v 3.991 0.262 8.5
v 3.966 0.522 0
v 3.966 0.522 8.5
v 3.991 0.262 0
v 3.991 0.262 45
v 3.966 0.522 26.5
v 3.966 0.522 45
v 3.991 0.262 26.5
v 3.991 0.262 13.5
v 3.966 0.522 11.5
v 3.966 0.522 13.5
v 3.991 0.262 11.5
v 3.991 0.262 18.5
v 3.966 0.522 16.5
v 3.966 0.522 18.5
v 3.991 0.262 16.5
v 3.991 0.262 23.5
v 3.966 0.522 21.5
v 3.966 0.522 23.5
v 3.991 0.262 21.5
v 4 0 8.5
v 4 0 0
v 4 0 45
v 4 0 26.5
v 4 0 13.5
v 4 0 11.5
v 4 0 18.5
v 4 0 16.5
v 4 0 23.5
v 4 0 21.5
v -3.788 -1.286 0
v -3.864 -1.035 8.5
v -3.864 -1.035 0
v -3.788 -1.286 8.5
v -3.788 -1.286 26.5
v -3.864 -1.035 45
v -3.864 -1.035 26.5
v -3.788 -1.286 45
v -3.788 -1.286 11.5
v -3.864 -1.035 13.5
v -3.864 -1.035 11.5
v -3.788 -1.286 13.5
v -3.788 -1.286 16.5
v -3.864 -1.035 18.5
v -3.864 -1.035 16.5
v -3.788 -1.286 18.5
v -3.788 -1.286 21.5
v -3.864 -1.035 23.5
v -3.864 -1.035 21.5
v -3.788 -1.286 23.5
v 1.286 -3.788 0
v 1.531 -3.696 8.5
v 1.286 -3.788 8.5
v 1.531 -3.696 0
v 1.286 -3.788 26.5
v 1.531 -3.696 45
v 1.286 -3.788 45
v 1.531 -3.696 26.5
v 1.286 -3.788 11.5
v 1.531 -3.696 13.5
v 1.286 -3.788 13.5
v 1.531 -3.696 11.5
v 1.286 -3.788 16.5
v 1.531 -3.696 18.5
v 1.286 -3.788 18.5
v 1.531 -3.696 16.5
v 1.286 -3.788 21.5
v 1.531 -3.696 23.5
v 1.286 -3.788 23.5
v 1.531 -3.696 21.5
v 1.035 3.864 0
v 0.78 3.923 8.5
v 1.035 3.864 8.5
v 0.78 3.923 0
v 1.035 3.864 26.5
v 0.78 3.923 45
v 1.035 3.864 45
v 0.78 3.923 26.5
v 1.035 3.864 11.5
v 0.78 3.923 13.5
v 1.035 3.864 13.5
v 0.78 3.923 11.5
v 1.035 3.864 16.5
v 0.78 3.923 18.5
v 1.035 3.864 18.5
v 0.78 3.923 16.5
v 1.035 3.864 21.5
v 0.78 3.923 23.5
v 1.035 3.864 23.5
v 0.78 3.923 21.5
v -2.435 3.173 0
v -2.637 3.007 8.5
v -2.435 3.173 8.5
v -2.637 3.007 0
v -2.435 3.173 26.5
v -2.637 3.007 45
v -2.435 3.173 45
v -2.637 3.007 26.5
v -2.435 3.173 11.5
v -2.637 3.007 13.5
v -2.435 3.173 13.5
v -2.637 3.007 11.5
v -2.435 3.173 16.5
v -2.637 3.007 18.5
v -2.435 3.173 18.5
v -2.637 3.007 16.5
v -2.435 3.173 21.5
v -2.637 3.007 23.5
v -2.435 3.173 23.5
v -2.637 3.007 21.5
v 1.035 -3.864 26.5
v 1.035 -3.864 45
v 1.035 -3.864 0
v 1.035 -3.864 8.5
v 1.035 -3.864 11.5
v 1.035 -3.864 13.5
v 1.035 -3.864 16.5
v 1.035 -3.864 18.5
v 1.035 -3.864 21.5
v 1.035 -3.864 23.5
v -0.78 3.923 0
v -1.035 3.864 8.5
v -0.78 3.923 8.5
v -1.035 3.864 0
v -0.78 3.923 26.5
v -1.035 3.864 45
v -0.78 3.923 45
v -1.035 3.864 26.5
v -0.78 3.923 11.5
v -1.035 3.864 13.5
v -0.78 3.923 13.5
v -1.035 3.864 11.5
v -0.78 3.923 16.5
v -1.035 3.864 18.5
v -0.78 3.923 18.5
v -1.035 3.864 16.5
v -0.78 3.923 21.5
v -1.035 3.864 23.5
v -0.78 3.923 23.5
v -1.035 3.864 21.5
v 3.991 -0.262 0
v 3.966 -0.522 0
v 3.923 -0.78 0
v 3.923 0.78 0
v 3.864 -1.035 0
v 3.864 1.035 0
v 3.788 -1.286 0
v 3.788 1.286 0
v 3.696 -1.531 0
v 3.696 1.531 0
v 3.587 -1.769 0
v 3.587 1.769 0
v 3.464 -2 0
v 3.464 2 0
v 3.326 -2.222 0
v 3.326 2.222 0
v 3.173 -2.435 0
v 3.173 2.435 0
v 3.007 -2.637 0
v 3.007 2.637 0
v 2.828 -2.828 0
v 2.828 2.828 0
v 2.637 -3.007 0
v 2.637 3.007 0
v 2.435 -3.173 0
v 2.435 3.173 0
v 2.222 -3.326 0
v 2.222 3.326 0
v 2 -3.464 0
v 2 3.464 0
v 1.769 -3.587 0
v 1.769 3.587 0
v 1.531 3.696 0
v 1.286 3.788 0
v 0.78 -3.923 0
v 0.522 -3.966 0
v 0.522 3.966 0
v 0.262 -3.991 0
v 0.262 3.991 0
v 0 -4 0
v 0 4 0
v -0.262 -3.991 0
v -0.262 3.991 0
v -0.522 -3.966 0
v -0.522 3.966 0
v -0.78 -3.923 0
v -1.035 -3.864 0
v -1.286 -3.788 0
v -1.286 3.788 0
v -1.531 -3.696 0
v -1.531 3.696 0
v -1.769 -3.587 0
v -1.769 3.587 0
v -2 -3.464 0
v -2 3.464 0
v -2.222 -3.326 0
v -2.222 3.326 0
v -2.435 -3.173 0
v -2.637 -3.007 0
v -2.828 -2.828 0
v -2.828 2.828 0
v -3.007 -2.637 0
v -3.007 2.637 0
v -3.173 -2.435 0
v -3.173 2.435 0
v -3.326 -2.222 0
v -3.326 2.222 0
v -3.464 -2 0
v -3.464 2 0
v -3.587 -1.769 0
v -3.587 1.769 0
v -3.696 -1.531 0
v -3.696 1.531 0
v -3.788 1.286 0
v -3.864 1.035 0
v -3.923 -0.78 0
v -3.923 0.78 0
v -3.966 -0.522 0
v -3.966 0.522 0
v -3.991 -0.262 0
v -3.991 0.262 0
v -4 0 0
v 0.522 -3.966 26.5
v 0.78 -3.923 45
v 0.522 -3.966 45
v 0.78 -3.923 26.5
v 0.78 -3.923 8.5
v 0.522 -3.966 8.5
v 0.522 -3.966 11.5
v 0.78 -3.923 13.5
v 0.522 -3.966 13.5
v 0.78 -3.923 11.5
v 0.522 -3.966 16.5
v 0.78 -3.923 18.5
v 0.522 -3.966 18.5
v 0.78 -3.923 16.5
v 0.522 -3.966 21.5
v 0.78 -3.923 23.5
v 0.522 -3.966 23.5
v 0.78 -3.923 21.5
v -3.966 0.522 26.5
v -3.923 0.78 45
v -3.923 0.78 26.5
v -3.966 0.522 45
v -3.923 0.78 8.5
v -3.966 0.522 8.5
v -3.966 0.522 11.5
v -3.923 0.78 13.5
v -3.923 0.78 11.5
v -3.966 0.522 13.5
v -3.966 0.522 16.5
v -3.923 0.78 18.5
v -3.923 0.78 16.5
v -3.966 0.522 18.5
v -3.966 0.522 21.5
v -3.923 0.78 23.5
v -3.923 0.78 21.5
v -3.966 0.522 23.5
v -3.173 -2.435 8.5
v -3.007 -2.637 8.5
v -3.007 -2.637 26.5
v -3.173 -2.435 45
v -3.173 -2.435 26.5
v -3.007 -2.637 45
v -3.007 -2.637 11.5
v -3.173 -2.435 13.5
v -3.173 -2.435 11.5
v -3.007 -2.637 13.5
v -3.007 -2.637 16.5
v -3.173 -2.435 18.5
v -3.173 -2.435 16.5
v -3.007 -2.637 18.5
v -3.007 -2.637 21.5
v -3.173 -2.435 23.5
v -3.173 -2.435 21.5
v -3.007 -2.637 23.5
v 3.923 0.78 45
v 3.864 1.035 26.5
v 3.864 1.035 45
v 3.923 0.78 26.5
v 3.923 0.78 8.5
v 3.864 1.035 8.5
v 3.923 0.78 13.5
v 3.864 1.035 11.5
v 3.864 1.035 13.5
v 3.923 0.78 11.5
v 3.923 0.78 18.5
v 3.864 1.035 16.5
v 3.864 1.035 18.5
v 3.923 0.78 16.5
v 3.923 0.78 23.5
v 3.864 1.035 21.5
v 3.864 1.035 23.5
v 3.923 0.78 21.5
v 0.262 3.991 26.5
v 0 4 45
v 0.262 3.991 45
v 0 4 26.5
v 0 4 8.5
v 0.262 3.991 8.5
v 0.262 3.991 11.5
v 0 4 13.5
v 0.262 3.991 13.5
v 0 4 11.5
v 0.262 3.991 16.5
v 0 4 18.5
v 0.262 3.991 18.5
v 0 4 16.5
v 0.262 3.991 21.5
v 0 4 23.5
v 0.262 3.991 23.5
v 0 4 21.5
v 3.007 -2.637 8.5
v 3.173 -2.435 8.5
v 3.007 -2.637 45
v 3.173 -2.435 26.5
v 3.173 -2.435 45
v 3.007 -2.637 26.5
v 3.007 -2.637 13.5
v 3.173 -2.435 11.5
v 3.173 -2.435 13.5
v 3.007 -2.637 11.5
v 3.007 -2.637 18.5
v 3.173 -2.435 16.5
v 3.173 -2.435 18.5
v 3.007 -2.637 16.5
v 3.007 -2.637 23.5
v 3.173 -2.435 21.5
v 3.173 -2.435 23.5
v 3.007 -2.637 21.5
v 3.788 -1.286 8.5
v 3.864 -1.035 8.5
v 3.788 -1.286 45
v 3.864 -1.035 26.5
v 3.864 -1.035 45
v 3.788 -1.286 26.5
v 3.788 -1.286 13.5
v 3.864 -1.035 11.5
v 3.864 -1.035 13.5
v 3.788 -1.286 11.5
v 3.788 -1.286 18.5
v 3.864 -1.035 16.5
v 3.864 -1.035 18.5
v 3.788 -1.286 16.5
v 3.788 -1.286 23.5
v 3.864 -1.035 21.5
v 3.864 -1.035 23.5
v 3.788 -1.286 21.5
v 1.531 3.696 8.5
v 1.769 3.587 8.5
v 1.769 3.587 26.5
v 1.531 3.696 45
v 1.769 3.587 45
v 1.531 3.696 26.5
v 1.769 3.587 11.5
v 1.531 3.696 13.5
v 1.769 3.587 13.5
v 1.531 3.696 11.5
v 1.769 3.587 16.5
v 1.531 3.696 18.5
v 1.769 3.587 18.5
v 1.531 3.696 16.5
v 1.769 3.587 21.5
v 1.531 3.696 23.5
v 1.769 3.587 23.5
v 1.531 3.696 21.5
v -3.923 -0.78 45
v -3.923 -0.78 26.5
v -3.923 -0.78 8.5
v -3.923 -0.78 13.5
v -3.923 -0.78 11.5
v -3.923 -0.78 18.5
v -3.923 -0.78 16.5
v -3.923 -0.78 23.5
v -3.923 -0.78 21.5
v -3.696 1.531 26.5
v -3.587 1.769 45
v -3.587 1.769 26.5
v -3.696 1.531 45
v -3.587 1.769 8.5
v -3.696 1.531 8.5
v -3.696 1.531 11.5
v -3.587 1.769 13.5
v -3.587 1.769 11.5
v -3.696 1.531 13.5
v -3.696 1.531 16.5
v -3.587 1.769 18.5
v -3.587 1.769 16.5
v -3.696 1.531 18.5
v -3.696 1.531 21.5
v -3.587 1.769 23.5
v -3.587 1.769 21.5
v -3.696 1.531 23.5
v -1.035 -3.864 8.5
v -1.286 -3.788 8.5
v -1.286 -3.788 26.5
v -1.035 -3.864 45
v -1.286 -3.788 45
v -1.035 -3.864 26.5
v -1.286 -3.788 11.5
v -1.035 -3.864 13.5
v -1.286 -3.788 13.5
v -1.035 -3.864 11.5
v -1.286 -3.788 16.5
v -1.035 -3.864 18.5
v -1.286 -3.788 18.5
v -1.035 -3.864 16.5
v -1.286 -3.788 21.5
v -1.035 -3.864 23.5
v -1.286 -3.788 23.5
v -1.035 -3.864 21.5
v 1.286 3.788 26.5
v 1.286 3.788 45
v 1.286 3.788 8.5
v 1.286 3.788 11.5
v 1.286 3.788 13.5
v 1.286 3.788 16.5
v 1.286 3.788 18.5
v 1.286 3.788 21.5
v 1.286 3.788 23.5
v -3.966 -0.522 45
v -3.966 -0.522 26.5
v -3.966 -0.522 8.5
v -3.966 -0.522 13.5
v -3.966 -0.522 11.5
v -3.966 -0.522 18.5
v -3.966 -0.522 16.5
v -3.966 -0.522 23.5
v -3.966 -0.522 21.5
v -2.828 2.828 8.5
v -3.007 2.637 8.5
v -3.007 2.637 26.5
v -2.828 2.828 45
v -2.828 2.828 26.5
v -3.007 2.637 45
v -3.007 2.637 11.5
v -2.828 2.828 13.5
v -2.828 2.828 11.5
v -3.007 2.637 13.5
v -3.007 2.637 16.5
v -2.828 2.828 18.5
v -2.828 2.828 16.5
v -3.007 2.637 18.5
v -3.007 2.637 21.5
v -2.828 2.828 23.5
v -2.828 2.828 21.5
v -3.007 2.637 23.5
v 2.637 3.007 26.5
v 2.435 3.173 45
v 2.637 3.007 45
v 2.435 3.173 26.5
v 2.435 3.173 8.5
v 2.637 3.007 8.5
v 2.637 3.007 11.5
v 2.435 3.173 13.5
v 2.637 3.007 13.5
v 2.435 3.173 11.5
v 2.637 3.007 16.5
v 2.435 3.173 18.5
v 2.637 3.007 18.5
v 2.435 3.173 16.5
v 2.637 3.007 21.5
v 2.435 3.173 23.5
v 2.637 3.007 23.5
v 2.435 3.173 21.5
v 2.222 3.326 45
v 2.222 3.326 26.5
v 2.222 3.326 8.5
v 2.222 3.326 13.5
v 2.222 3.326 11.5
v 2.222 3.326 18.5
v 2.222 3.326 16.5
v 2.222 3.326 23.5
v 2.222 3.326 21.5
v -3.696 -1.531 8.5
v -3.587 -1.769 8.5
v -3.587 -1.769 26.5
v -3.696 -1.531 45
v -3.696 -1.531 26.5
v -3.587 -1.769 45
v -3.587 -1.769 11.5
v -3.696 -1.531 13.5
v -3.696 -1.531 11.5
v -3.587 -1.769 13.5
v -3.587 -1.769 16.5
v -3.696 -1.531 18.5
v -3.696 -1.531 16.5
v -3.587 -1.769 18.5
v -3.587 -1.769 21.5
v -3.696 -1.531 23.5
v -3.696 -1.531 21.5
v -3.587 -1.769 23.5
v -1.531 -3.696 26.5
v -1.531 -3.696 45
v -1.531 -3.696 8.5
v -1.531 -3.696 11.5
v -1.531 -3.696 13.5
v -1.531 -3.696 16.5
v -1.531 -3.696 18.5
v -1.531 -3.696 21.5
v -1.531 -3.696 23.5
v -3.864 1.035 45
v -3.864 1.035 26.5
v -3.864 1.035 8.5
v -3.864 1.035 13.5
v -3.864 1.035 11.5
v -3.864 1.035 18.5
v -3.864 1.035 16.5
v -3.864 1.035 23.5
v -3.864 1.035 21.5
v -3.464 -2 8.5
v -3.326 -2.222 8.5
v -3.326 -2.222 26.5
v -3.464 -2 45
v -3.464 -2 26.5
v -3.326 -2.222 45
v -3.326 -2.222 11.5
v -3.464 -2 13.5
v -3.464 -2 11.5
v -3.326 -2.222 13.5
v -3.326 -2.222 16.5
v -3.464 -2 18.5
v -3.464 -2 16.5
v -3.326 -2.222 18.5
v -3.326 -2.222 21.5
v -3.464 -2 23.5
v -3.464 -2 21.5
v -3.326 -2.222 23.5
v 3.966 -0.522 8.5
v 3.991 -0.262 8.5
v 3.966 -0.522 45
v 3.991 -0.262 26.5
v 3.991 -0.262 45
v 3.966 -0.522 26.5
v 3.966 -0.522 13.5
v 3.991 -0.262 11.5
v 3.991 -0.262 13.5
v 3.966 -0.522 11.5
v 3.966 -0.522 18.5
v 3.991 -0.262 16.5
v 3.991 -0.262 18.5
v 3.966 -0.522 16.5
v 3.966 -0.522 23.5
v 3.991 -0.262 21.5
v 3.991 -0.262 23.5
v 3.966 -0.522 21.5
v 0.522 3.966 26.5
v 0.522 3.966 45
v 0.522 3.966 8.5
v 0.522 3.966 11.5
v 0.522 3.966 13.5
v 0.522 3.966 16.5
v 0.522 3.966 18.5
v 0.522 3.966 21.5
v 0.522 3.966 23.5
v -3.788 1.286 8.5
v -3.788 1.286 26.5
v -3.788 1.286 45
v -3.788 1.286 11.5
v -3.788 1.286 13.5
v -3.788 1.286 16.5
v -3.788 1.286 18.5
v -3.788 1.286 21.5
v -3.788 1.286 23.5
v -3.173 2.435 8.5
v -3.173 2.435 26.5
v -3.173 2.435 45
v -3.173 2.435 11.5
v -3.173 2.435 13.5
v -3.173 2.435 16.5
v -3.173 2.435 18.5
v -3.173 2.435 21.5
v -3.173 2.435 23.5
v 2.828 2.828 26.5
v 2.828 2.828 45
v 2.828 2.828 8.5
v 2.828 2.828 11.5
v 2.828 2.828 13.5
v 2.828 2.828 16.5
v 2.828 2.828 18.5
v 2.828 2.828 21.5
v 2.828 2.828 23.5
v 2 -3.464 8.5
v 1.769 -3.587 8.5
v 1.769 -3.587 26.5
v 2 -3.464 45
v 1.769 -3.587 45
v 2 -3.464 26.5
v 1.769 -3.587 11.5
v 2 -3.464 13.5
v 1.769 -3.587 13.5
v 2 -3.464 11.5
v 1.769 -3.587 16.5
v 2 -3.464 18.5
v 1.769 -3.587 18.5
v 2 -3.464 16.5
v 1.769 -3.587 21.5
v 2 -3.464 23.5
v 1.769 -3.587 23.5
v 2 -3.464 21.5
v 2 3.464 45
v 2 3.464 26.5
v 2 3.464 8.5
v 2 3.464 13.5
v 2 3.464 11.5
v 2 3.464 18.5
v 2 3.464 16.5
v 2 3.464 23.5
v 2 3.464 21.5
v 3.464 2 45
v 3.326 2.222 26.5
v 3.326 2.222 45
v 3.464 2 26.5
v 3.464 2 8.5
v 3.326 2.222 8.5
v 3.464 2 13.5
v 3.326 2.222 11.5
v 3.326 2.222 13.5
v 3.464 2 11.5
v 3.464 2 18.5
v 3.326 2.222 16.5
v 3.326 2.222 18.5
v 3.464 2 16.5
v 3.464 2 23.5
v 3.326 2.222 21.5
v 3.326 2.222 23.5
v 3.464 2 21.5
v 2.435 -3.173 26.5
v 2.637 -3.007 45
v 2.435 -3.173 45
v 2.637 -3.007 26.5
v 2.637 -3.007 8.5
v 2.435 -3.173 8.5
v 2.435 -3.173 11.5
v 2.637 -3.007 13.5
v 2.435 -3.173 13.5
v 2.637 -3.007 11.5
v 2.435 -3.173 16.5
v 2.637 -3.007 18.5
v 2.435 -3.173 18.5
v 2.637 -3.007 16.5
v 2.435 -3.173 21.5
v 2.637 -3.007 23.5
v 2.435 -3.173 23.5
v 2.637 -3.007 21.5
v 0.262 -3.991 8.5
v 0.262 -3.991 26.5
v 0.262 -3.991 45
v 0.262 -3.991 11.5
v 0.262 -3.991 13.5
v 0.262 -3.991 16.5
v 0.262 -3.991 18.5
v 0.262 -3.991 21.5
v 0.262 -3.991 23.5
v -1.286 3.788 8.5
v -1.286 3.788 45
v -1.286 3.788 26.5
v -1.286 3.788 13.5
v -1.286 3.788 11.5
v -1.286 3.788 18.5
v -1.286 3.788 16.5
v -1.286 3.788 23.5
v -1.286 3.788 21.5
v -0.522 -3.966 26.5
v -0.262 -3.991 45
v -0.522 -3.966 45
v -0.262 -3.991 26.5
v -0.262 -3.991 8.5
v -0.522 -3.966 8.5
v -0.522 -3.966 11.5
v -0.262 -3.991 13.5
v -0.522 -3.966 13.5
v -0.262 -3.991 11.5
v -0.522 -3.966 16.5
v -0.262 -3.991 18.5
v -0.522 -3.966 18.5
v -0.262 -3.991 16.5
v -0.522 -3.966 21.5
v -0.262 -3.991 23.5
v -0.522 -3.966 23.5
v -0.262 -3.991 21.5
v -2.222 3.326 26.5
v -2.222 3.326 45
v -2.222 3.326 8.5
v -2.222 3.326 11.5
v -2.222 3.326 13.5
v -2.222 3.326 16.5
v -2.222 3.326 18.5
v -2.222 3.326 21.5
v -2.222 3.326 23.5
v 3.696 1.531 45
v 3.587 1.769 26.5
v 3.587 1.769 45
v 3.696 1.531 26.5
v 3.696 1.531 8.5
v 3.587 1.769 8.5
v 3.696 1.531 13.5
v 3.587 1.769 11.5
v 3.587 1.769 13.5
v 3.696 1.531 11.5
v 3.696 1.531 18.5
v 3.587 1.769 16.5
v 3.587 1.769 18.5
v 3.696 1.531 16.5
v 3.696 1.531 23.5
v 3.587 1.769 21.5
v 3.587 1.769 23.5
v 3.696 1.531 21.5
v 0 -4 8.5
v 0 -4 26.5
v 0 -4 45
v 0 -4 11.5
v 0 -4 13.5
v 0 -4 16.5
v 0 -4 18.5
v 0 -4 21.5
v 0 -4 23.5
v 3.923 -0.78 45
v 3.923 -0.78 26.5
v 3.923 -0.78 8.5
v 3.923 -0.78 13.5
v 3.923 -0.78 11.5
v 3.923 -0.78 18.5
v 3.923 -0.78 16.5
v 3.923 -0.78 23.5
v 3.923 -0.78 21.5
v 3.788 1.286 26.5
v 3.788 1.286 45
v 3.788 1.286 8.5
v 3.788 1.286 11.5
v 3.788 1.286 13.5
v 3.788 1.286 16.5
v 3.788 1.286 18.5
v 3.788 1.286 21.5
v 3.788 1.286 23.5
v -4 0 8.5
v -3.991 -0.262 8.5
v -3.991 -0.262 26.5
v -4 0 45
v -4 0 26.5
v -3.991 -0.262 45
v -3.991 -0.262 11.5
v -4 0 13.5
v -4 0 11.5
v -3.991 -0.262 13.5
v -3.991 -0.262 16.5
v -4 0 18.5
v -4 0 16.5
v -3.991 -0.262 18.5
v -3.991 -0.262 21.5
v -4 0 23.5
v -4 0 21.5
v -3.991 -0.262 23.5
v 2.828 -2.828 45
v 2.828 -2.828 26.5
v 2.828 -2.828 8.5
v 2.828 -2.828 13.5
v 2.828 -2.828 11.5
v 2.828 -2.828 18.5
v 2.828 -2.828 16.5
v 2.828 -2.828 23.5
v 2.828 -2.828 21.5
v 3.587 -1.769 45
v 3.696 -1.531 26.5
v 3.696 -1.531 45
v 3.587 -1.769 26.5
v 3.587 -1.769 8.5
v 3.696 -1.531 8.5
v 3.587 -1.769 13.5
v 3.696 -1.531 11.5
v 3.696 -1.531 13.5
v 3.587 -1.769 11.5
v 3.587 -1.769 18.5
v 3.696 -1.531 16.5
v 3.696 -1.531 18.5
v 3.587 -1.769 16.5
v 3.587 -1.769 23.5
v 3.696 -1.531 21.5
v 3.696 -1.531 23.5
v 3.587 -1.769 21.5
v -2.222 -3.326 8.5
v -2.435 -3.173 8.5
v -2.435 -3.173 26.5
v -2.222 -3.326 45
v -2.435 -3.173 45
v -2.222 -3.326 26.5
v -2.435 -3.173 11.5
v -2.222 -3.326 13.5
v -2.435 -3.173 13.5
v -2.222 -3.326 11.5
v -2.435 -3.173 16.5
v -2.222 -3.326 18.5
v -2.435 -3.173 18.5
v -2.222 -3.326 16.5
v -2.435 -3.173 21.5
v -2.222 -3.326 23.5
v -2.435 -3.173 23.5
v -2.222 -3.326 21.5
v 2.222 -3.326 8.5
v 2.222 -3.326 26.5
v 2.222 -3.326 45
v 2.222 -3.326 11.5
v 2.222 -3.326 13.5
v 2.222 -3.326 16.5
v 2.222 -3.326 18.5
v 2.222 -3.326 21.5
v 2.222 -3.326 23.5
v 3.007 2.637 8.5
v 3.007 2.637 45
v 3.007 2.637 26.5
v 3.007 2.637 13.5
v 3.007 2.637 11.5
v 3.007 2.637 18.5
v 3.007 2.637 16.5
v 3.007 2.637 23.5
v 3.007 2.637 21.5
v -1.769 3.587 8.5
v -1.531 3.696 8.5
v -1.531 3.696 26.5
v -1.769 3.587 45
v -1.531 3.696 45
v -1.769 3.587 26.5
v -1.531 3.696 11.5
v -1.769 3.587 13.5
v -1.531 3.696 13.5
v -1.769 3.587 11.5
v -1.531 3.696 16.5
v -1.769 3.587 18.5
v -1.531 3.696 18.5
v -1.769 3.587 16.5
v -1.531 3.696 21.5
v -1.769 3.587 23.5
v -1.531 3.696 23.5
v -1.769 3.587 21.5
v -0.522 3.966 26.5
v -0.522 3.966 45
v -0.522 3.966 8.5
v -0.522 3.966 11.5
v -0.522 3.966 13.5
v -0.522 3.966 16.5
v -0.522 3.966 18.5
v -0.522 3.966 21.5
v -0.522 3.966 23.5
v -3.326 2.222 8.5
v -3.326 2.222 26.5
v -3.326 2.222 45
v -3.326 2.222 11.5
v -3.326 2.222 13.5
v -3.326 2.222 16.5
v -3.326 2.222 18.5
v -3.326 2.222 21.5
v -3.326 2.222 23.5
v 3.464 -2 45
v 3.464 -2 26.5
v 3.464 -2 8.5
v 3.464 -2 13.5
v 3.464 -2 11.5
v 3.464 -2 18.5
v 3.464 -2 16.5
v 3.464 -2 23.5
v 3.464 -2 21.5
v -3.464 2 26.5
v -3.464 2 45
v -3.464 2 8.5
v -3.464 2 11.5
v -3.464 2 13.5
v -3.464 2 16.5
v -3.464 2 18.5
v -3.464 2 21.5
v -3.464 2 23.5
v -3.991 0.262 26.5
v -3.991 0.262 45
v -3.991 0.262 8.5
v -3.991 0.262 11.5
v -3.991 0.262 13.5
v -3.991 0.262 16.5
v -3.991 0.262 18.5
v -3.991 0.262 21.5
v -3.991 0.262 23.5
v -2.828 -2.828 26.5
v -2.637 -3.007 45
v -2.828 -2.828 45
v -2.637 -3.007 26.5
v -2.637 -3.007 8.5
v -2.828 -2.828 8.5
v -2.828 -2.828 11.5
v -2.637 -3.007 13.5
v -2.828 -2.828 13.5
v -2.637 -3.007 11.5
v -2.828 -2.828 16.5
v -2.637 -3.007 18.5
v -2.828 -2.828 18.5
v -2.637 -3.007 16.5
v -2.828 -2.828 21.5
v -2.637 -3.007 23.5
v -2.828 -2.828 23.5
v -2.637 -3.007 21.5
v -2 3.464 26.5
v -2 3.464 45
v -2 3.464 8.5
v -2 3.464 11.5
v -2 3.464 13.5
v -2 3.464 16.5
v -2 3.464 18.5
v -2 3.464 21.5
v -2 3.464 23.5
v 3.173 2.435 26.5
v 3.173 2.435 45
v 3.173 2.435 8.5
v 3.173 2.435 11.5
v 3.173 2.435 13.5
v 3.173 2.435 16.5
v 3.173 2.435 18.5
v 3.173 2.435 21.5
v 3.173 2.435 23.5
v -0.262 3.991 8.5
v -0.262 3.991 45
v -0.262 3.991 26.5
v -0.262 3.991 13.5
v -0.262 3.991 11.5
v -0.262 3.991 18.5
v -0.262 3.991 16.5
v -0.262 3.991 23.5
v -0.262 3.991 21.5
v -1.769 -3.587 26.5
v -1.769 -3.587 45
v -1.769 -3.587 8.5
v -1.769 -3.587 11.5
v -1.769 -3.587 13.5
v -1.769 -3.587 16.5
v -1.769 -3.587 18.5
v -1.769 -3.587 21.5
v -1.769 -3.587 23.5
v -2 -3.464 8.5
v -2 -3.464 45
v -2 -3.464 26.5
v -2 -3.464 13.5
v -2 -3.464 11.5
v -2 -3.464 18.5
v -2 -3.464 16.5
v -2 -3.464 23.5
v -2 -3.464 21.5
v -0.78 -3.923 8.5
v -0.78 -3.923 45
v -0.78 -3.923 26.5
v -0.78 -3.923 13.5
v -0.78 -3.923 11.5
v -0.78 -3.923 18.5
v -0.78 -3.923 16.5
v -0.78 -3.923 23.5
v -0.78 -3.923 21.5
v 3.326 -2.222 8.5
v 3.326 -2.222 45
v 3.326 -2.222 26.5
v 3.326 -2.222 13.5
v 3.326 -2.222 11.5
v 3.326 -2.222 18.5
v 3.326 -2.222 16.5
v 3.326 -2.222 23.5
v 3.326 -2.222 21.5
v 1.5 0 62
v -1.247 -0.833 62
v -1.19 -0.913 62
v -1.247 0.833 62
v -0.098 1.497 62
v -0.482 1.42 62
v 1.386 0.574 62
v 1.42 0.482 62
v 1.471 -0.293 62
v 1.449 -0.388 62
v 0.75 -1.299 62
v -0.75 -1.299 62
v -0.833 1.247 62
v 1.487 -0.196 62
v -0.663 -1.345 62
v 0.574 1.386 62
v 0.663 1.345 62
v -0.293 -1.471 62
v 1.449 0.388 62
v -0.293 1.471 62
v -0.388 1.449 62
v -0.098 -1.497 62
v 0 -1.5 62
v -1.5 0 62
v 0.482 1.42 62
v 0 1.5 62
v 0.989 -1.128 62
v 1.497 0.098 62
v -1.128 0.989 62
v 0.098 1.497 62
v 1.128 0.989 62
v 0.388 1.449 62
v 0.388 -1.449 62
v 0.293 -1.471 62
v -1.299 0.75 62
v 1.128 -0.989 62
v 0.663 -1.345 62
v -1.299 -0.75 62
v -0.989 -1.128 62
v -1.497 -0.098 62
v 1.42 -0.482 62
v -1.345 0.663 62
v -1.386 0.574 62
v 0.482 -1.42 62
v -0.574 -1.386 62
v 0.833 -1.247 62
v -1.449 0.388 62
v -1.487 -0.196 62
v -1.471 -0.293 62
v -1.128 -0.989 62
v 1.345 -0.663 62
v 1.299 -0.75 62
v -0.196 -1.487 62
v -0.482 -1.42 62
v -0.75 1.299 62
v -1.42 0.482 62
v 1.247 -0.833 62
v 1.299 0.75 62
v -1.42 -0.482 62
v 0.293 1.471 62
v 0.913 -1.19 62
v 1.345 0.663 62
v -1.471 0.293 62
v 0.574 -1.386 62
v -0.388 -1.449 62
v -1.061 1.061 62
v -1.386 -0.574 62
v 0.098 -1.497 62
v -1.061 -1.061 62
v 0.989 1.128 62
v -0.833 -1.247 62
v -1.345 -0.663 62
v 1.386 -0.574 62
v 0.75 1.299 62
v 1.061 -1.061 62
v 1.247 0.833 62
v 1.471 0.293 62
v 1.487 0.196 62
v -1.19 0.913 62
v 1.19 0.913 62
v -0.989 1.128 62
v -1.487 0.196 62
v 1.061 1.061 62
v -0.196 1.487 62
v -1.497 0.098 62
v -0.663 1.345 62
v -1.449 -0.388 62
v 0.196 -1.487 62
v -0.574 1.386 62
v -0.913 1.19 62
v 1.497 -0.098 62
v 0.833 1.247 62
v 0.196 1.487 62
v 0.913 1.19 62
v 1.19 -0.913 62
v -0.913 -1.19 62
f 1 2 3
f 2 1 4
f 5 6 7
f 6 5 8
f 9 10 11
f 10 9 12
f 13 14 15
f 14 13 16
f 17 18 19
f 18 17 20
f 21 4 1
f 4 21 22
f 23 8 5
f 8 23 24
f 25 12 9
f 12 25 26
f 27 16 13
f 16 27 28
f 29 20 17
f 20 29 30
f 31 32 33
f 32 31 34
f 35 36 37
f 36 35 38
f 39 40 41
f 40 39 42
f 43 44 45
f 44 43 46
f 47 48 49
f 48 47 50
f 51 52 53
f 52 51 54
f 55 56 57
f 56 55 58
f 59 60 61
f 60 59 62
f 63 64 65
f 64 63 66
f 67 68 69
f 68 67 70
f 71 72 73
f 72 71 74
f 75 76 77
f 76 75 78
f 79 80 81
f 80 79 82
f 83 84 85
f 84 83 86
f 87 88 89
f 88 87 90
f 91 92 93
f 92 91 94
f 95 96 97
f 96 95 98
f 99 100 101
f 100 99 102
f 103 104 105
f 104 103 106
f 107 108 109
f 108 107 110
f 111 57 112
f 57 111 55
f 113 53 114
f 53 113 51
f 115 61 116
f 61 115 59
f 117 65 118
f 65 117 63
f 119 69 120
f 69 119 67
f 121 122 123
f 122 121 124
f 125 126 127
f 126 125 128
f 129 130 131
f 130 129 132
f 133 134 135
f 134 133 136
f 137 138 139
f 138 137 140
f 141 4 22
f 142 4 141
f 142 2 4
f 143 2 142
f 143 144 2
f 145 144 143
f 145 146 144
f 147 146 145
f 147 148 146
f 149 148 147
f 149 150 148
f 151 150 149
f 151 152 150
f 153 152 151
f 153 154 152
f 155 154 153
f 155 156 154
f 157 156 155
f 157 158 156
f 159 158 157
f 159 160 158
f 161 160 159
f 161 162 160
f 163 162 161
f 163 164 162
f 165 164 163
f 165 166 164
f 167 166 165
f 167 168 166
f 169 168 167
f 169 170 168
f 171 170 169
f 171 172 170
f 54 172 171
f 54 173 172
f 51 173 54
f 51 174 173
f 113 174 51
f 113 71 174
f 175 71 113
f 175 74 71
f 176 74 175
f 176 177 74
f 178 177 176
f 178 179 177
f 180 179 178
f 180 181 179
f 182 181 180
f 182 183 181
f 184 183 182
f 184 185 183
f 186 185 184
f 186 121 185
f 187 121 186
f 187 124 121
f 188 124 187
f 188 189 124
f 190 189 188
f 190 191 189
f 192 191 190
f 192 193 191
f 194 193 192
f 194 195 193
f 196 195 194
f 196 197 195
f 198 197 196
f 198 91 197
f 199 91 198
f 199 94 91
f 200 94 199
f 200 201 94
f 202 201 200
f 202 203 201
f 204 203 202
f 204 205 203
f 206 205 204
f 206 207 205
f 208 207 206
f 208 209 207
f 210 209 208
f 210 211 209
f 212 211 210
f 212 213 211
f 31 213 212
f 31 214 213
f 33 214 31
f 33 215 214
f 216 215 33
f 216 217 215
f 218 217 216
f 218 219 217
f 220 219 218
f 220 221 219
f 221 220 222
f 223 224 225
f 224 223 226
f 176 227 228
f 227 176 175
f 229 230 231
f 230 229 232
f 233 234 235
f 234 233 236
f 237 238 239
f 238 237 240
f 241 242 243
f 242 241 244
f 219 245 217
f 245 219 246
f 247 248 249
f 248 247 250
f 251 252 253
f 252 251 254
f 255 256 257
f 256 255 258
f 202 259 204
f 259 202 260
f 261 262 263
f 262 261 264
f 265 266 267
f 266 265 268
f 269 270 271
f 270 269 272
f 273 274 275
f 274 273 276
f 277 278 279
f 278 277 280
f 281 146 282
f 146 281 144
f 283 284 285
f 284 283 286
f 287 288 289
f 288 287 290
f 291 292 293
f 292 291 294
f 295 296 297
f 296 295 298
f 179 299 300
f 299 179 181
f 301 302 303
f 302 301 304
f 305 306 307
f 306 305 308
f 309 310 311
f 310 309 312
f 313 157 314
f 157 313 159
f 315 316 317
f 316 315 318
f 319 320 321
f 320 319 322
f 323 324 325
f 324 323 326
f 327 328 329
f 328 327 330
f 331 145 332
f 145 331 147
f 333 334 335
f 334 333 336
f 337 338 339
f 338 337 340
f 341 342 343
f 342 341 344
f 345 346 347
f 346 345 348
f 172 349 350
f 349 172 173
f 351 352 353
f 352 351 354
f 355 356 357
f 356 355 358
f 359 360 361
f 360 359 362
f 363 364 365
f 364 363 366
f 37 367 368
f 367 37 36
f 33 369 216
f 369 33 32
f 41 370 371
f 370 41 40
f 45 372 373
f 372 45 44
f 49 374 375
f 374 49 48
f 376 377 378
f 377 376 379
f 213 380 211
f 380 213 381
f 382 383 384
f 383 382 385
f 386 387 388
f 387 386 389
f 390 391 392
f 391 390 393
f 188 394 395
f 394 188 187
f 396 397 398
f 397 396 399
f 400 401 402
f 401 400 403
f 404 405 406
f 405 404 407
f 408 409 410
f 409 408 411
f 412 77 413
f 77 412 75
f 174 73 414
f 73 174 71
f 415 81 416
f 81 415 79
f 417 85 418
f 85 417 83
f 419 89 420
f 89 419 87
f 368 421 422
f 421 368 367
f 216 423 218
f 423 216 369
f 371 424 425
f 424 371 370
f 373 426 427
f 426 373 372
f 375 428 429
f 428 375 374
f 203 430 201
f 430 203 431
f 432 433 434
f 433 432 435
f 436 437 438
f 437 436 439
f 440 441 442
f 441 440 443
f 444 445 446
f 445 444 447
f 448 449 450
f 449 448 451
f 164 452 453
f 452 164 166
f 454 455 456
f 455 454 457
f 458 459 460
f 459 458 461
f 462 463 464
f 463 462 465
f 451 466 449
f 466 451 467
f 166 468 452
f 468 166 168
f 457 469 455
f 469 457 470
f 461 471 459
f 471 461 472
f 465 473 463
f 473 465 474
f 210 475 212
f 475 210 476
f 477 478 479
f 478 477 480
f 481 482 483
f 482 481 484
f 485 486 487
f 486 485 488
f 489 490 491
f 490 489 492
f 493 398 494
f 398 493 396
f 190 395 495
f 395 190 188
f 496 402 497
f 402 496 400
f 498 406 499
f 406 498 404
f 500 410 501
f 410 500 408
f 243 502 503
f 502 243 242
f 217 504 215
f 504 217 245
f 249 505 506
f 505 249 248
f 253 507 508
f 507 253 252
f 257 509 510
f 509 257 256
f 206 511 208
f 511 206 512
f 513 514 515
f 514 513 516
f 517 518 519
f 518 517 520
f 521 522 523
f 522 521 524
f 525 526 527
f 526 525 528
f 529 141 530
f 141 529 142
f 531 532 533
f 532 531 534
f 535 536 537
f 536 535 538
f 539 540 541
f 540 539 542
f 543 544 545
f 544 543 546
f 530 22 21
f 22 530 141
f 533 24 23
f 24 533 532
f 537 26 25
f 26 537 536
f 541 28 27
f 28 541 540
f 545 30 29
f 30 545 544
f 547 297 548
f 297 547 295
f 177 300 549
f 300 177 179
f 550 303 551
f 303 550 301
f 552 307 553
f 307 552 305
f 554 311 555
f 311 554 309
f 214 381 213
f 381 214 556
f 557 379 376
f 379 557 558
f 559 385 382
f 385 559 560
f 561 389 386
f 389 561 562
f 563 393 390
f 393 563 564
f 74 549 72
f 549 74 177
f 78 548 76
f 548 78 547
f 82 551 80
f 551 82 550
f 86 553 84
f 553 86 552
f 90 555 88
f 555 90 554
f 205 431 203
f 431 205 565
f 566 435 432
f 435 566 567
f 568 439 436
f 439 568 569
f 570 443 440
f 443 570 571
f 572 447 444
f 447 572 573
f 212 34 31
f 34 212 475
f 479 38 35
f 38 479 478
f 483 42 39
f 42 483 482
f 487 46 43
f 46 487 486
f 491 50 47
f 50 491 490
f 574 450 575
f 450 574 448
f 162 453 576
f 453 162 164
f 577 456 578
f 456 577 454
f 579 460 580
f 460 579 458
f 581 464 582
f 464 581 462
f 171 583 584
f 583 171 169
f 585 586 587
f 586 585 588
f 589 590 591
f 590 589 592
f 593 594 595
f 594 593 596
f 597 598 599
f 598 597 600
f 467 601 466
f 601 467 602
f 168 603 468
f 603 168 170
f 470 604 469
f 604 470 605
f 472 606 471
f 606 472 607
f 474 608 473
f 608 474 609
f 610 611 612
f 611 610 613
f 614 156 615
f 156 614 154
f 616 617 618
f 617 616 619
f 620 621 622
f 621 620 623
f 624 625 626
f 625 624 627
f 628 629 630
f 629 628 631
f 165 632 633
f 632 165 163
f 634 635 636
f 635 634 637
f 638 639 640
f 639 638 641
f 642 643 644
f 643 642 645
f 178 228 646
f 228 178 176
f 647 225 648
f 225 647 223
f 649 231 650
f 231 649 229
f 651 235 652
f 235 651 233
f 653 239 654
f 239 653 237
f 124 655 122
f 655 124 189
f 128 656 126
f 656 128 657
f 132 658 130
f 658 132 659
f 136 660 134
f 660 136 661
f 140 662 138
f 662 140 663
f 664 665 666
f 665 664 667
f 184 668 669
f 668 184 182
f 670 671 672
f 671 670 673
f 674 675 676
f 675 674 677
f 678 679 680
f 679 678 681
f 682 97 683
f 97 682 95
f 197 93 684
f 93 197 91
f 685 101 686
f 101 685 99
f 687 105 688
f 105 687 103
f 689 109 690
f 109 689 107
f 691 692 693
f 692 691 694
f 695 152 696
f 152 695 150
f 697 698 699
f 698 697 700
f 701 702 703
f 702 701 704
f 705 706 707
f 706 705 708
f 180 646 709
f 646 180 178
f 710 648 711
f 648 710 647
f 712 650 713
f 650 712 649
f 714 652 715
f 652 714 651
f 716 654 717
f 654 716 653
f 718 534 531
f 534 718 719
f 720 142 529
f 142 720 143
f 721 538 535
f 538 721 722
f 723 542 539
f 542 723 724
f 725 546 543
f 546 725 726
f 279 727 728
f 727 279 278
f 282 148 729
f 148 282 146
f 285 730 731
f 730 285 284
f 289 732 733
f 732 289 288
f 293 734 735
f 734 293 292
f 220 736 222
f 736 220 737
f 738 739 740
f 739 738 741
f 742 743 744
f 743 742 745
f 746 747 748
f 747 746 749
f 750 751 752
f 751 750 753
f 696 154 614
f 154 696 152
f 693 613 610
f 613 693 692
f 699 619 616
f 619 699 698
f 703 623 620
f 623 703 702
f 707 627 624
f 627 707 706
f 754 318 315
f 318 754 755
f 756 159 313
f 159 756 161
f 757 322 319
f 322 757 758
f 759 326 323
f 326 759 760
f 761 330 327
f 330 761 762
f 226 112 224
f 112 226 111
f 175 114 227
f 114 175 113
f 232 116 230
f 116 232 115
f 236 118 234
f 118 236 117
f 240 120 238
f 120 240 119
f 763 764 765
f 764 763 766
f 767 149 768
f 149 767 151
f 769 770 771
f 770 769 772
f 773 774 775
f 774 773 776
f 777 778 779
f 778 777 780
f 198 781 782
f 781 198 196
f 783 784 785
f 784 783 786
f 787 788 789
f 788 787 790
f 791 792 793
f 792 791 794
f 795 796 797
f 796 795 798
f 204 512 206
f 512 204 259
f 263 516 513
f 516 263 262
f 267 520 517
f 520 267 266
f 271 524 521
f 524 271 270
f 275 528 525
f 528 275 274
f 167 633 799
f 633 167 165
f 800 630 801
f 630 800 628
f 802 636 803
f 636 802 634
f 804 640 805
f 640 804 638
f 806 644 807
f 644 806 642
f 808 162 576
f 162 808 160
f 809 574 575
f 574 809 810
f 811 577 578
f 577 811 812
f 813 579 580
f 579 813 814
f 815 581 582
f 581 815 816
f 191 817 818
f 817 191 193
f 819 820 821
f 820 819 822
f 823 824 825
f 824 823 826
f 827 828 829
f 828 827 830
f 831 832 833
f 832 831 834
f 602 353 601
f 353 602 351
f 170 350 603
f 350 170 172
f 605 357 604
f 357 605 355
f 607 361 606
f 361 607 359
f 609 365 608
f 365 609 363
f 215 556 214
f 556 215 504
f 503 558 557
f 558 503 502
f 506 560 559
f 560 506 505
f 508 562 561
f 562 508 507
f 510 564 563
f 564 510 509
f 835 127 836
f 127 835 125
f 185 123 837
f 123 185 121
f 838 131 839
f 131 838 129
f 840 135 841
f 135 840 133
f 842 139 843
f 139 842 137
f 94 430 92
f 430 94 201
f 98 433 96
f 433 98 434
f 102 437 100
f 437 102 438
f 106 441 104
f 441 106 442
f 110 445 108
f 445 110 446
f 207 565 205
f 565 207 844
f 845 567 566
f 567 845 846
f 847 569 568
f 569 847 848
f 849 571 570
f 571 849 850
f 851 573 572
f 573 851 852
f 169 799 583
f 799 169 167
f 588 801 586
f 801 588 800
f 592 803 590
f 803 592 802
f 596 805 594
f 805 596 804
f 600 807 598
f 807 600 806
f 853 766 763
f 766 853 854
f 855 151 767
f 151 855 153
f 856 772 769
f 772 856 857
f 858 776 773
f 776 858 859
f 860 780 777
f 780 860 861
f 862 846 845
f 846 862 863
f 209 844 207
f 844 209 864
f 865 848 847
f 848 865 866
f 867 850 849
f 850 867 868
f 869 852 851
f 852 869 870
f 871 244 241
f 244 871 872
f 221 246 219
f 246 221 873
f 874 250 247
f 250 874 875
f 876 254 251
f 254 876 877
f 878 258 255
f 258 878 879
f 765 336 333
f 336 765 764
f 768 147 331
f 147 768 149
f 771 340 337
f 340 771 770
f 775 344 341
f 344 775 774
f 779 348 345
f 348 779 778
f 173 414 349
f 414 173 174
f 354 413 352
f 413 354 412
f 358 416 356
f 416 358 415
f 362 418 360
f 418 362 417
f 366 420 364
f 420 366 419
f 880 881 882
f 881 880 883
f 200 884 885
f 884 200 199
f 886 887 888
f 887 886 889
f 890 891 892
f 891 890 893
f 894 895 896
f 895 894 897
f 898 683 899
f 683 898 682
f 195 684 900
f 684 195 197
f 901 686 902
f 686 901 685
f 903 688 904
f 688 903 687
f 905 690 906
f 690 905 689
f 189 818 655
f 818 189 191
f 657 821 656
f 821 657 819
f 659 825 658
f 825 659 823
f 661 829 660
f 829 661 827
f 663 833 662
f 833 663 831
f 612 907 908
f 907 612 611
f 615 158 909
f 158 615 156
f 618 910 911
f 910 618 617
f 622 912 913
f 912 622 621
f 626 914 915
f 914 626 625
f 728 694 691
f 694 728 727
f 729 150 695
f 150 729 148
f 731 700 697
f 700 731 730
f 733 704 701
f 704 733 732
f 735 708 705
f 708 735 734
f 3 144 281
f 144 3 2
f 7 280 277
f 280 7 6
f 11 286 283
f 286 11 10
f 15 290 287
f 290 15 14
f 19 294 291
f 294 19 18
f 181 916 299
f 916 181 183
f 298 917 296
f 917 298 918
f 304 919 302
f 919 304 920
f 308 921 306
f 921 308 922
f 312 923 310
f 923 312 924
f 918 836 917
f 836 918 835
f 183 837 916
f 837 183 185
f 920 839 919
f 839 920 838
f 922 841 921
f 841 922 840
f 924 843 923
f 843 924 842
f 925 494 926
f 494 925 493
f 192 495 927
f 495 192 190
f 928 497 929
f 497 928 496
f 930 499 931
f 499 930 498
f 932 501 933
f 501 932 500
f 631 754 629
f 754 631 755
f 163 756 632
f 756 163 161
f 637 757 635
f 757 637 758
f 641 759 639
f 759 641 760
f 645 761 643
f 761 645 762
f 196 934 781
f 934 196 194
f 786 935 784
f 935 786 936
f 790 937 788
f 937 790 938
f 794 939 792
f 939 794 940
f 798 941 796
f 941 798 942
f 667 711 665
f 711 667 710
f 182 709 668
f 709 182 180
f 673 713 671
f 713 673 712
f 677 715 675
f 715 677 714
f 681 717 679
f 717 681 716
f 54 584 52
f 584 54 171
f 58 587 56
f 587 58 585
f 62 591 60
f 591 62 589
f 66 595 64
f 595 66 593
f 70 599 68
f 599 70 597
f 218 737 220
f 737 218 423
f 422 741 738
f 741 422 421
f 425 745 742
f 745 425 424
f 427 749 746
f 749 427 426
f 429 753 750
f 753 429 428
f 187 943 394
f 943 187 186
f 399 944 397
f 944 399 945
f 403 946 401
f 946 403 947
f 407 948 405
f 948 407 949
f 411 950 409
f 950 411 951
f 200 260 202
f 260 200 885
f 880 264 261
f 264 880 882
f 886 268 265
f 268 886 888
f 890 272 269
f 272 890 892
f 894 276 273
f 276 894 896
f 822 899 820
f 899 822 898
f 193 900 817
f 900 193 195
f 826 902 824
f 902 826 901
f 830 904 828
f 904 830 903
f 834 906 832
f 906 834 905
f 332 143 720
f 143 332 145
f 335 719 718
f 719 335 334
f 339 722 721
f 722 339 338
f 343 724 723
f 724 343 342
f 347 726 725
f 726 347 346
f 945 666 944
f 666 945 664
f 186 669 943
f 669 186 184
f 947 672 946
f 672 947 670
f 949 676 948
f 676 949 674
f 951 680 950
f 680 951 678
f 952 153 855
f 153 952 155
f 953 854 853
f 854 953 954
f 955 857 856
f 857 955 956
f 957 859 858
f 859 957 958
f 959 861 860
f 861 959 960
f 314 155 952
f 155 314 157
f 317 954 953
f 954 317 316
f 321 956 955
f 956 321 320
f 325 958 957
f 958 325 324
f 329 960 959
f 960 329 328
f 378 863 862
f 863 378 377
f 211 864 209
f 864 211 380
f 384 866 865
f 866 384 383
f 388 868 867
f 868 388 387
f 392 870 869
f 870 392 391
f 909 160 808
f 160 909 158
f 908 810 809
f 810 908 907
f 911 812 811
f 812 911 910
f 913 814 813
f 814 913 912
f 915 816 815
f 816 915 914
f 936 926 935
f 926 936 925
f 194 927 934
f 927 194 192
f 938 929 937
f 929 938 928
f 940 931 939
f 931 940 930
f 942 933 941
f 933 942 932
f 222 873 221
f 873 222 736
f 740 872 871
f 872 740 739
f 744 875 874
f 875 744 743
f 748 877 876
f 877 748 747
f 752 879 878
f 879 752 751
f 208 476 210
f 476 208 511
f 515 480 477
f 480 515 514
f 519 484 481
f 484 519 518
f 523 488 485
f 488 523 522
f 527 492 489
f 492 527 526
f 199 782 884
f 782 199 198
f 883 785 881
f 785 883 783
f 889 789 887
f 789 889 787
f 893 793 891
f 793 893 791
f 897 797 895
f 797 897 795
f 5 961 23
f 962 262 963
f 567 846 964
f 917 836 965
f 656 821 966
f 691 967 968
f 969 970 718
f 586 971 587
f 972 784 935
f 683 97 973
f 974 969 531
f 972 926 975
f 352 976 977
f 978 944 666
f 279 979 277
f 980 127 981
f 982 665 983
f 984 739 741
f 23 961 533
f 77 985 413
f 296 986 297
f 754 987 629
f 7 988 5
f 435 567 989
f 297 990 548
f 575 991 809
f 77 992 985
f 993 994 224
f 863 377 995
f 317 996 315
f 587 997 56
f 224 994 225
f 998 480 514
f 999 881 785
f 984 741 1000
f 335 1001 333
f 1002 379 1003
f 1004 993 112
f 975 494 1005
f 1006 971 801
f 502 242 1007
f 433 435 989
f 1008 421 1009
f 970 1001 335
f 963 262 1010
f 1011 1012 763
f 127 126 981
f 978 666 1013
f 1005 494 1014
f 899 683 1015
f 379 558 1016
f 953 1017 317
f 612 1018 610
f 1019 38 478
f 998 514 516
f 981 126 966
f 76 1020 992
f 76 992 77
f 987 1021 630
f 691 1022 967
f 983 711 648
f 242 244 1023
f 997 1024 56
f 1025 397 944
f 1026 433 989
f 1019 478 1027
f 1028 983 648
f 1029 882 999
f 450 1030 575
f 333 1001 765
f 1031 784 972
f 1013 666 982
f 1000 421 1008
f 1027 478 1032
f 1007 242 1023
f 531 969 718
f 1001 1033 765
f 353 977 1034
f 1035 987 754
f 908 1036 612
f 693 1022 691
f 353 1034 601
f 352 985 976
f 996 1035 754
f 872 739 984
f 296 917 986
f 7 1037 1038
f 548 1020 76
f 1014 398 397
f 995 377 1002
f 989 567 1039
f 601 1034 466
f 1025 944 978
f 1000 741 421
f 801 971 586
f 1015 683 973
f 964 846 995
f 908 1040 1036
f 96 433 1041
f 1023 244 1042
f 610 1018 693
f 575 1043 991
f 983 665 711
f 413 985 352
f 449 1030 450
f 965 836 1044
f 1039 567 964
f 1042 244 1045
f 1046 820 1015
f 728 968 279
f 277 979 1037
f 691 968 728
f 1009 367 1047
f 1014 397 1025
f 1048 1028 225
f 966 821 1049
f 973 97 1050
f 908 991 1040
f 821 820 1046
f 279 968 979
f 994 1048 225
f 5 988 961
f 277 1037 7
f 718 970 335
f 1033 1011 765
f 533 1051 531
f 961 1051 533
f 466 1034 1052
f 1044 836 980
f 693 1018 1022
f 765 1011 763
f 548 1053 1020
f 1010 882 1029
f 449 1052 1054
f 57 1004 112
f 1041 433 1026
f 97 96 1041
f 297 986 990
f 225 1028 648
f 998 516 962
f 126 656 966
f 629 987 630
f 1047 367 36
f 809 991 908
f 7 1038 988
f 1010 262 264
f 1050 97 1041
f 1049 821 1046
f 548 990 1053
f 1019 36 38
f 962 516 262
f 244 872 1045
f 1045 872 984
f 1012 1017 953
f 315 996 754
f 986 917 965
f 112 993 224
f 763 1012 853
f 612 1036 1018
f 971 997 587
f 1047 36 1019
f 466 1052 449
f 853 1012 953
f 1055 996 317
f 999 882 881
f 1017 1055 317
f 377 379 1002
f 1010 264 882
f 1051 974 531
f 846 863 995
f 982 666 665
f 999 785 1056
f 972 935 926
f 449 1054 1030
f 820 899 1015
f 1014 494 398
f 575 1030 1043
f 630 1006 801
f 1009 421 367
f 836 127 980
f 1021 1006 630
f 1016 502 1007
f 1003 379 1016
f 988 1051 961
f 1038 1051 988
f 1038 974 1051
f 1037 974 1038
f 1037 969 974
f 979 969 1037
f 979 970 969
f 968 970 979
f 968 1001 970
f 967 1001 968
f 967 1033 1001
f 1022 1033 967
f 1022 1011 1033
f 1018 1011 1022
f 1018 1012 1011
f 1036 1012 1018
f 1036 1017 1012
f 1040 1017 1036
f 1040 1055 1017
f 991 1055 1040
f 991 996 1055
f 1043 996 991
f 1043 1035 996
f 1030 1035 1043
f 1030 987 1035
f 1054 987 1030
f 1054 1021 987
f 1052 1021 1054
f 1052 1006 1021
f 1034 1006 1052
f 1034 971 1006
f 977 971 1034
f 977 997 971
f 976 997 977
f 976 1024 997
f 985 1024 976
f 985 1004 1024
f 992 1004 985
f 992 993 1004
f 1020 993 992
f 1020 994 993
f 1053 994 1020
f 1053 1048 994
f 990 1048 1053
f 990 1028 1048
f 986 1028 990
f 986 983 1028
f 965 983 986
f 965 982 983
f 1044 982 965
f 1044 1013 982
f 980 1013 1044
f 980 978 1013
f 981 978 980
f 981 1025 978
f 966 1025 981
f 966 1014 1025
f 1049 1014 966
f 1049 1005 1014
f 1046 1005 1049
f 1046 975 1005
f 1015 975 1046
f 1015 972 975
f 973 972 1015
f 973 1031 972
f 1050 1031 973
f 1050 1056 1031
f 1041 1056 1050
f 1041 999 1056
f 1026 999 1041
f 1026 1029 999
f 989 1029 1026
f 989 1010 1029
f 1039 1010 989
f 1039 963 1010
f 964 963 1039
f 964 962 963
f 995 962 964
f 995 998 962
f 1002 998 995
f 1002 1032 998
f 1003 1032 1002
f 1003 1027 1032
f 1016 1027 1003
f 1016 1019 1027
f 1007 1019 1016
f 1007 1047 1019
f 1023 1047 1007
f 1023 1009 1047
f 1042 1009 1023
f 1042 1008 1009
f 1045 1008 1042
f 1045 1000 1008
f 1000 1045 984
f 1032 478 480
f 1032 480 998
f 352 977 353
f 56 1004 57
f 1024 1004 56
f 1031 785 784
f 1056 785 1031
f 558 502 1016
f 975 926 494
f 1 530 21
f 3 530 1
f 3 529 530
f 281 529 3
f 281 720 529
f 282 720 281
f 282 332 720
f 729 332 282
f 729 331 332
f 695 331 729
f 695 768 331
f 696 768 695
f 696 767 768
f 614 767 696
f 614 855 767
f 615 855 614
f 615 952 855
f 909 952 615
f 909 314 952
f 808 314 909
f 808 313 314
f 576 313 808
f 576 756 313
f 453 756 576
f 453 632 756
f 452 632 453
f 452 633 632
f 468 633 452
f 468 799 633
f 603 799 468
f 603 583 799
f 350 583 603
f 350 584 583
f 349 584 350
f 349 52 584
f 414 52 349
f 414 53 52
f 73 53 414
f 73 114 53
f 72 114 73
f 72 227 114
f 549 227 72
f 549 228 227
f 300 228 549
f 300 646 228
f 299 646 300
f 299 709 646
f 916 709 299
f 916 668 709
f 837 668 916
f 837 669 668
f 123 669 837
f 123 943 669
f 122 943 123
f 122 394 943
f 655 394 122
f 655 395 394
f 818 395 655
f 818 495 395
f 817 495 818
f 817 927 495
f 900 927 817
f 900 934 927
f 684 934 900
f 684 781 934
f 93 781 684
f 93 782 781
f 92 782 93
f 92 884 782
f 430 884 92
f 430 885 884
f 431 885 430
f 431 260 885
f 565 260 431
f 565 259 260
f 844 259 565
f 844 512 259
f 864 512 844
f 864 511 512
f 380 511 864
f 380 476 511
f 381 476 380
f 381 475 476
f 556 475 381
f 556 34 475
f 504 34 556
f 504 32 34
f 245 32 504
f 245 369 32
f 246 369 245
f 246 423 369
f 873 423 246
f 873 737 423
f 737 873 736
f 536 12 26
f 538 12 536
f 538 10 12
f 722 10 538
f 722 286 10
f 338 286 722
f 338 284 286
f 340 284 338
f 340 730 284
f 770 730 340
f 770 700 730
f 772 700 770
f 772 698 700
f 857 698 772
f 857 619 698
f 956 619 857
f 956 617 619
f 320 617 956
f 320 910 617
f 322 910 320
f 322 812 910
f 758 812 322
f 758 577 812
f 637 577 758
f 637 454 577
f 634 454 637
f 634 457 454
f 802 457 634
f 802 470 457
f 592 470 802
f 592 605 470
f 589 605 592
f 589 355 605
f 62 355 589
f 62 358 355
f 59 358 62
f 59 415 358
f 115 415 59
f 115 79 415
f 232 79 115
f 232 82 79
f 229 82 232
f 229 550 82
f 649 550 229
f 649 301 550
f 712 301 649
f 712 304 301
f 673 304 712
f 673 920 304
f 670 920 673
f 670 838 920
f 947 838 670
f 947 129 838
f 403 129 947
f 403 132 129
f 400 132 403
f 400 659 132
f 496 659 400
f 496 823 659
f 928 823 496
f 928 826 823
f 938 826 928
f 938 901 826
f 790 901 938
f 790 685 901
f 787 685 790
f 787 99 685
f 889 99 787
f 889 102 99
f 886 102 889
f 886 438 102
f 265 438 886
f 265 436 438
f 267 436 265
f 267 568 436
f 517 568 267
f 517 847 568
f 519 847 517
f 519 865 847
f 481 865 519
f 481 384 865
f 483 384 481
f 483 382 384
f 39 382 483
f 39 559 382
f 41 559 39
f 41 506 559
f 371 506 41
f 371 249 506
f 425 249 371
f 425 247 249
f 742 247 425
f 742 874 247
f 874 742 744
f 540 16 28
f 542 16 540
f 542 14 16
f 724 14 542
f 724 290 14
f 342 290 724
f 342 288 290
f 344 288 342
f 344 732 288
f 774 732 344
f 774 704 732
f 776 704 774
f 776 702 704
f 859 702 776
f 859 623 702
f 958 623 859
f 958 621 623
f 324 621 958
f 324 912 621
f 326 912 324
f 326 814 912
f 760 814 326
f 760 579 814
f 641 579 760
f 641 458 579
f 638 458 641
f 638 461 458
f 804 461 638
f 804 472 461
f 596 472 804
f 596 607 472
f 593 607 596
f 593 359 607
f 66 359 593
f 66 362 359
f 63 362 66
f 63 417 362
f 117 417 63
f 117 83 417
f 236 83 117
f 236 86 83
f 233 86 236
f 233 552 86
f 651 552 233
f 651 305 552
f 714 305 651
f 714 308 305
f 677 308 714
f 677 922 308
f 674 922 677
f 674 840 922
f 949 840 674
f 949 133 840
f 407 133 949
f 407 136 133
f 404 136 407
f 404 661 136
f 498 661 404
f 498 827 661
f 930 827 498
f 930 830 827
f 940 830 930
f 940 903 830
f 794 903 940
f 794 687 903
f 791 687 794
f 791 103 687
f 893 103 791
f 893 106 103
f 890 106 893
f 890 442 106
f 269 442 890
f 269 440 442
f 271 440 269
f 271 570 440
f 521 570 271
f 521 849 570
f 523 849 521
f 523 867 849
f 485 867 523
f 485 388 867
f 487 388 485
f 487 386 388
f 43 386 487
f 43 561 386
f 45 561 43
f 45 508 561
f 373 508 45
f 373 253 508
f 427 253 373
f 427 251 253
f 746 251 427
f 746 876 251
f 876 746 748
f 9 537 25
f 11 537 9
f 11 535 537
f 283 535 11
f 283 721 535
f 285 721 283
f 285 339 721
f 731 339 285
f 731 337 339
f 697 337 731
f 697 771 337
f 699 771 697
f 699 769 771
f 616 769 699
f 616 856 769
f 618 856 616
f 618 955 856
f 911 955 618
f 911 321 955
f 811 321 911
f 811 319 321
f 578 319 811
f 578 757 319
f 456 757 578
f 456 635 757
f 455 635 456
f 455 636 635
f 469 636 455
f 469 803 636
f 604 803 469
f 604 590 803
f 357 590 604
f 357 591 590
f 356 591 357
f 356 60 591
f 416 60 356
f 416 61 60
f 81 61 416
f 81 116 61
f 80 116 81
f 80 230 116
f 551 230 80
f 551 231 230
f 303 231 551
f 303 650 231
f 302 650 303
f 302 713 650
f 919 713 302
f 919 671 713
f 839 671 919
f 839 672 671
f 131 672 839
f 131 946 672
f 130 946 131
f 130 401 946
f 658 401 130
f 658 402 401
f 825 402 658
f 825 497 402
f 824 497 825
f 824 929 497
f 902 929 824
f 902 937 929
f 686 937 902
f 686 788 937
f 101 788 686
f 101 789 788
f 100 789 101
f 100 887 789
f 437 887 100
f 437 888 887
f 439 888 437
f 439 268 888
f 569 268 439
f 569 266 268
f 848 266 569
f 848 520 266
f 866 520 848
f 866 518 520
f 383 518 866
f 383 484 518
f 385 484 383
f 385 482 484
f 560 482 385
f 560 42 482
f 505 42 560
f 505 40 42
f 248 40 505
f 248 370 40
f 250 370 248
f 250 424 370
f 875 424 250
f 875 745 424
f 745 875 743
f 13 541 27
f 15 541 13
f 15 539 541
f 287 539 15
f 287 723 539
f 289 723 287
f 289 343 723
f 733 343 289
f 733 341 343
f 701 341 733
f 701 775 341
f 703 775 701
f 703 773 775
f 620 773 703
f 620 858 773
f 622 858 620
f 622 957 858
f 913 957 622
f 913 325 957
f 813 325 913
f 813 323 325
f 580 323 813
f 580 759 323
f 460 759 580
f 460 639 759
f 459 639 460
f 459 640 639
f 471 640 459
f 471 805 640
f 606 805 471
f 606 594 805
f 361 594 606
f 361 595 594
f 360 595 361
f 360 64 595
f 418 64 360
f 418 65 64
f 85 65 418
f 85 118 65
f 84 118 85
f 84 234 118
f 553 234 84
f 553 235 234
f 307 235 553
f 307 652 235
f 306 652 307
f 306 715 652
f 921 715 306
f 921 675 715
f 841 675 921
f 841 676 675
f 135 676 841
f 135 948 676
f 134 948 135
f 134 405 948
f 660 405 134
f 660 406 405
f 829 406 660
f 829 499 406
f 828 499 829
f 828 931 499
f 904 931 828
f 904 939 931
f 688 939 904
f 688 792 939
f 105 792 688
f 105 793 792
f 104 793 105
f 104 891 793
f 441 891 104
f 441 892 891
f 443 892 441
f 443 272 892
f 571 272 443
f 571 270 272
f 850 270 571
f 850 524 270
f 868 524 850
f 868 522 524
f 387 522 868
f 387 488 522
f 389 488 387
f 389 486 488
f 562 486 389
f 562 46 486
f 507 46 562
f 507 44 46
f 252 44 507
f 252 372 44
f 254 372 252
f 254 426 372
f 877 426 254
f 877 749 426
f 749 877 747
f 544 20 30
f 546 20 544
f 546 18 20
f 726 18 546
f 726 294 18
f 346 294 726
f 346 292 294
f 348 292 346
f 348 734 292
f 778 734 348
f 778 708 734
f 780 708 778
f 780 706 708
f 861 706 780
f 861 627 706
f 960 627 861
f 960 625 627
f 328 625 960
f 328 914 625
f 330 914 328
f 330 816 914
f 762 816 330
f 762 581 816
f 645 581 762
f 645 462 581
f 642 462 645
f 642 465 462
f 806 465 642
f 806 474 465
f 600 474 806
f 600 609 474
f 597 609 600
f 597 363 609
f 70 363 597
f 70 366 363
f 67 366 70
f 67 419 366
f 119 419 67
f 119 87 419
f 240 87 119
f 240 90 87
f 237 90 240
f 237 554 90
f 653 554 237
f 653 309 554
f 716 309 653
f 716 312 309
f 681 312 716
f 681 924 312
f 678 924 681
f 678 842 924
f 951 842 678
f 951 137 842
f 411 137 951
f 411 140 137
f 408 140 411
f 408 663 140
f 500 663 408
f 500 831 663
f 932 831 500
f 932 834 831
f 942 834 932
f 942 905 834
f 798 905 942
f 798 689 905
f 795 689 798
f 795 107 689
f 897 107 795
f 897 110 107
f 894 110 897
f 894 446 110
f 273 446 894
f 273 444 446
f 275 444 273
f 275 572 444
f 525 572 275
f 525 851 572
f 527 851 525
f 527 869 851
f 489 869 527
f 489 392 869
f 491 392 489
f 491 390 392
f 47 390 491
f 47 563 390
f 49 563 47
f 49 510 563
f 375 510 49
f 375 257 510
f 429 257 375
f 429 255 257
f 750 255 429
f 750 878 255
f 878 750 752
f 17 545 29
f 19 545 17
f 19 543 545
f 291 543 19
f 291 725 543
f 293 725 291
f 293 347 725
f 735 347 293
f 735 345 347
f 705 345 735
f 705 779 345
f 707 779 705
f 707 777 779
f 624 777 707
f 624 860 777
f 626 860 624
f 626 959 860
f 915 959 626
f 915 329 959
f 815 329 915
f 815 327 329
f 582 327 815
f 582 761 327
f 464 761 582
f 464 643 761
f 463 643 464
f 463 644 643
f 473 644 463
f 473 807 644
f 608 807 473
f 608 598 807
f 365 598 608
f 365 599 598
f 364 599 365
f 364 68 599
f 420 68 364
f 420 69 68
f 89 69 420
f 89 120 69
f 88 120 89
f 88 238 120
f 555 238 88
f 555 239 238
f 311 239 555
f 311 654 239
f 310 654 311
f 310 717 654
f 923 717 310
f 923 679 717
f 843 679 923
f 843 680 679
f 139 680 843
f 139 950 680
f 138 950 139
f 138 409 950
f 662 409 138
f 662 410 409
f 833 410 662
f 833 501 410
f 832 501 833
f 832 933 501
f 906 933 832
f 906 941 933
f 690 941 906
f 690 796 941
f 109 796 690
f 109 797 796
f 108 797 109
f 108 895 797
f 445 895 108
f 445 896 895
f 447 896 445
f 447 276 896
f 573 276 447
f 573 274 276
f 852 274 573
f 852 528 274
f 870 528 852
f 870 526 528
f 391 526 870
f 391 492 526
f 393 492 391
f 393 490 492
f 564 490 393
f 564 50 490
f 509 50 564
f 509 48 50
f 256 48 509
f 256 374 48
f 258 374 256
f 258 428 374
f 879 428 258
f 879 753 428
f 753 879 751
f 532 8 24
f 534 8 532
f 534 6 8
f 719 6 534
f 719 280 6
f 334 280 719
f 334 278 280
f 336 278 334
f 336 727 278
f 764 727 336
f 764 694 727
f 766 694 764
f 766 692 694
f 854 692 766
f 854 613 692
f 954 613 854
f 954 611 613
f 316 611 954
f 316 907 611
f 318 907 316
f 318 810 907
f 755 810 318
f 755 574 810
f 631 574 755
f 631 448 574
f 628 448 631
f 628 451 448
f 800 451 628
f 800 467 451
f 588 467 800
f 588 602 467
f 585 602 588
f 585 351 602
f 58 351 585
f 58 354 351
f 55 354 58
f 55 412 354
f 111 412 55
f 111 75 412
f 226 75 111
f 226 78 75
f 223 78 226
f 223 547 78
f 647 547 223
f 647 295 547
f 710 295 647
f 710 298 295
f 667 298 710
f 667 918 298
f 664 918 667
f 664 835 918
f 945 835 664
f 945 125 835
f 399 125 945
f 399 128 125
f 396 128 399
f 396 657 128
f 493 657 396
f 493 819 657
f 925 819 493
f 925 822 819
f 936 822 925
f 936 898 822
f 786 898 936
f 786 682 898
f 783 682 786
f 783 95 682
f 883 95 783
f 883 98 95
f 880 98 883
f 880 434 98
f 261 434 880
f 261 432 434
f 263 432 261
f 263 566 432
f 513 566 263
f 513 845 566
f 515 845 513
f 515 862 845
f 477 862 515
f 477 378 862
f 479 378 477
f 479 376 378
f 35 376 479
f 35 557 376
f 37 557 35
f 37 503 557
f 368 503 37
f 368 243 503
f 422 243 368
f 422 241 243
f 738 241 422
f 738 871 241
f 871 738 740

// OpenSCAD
// Pestle for 1.5 mL microcentrifuge tube
// Print orientation: standing upright on the bed (z = 0)

// ---------------- Parameters ----------------
handle_d      = 8;    // handle diameter (mm)
handle_h      = 45;   // handle height (mm)

cone_top_d    = 8;    // cone diameter at top of handle (mm)
cone_bottom_d = 3;    // cone diameter at tip base (mm)
cone_h        = 17;   // cone height (mm), z = 45 to z = 62

tip_d         = 3;    // sphere tip diameter (mm)
tip_z         = 62;   // sphere centre height (mm)

groove_w      = 2;    // groove width in Z (mm)
groove_depth  = 1;    // groove depth into handle (mm)
groove_z      = [10, 15, 20, 25]; // groove centre heights (mm)

overcut       = 0.5;  // extra length on cutters past faces (mm)
$fn           = 96;   // curve resolution

// ---------------- Model ----------------
difference() {
    union() {
        // (1) Cylindrical handle
        cylinder(d = handle_d, h = handle_h);

        // (2) Tapering cone
        translate([0, 0, handle_h])
            cylinder(d1 = cone_top_d, d2 = cone_bottom_d, h = cone_h);

        // (3) Rounded tip
        translate([0, 0, tip_z - tip_d / 2])
            sphere(d = tip_d);
    }

    // Grip grooves cut into the handle
    for (z = groove_z)
        translate([0, 0, z - groove_w / 2 - overcut])
            cylinder(d = handle_d + 2, h = groove_w + 2 * overcut);
}
